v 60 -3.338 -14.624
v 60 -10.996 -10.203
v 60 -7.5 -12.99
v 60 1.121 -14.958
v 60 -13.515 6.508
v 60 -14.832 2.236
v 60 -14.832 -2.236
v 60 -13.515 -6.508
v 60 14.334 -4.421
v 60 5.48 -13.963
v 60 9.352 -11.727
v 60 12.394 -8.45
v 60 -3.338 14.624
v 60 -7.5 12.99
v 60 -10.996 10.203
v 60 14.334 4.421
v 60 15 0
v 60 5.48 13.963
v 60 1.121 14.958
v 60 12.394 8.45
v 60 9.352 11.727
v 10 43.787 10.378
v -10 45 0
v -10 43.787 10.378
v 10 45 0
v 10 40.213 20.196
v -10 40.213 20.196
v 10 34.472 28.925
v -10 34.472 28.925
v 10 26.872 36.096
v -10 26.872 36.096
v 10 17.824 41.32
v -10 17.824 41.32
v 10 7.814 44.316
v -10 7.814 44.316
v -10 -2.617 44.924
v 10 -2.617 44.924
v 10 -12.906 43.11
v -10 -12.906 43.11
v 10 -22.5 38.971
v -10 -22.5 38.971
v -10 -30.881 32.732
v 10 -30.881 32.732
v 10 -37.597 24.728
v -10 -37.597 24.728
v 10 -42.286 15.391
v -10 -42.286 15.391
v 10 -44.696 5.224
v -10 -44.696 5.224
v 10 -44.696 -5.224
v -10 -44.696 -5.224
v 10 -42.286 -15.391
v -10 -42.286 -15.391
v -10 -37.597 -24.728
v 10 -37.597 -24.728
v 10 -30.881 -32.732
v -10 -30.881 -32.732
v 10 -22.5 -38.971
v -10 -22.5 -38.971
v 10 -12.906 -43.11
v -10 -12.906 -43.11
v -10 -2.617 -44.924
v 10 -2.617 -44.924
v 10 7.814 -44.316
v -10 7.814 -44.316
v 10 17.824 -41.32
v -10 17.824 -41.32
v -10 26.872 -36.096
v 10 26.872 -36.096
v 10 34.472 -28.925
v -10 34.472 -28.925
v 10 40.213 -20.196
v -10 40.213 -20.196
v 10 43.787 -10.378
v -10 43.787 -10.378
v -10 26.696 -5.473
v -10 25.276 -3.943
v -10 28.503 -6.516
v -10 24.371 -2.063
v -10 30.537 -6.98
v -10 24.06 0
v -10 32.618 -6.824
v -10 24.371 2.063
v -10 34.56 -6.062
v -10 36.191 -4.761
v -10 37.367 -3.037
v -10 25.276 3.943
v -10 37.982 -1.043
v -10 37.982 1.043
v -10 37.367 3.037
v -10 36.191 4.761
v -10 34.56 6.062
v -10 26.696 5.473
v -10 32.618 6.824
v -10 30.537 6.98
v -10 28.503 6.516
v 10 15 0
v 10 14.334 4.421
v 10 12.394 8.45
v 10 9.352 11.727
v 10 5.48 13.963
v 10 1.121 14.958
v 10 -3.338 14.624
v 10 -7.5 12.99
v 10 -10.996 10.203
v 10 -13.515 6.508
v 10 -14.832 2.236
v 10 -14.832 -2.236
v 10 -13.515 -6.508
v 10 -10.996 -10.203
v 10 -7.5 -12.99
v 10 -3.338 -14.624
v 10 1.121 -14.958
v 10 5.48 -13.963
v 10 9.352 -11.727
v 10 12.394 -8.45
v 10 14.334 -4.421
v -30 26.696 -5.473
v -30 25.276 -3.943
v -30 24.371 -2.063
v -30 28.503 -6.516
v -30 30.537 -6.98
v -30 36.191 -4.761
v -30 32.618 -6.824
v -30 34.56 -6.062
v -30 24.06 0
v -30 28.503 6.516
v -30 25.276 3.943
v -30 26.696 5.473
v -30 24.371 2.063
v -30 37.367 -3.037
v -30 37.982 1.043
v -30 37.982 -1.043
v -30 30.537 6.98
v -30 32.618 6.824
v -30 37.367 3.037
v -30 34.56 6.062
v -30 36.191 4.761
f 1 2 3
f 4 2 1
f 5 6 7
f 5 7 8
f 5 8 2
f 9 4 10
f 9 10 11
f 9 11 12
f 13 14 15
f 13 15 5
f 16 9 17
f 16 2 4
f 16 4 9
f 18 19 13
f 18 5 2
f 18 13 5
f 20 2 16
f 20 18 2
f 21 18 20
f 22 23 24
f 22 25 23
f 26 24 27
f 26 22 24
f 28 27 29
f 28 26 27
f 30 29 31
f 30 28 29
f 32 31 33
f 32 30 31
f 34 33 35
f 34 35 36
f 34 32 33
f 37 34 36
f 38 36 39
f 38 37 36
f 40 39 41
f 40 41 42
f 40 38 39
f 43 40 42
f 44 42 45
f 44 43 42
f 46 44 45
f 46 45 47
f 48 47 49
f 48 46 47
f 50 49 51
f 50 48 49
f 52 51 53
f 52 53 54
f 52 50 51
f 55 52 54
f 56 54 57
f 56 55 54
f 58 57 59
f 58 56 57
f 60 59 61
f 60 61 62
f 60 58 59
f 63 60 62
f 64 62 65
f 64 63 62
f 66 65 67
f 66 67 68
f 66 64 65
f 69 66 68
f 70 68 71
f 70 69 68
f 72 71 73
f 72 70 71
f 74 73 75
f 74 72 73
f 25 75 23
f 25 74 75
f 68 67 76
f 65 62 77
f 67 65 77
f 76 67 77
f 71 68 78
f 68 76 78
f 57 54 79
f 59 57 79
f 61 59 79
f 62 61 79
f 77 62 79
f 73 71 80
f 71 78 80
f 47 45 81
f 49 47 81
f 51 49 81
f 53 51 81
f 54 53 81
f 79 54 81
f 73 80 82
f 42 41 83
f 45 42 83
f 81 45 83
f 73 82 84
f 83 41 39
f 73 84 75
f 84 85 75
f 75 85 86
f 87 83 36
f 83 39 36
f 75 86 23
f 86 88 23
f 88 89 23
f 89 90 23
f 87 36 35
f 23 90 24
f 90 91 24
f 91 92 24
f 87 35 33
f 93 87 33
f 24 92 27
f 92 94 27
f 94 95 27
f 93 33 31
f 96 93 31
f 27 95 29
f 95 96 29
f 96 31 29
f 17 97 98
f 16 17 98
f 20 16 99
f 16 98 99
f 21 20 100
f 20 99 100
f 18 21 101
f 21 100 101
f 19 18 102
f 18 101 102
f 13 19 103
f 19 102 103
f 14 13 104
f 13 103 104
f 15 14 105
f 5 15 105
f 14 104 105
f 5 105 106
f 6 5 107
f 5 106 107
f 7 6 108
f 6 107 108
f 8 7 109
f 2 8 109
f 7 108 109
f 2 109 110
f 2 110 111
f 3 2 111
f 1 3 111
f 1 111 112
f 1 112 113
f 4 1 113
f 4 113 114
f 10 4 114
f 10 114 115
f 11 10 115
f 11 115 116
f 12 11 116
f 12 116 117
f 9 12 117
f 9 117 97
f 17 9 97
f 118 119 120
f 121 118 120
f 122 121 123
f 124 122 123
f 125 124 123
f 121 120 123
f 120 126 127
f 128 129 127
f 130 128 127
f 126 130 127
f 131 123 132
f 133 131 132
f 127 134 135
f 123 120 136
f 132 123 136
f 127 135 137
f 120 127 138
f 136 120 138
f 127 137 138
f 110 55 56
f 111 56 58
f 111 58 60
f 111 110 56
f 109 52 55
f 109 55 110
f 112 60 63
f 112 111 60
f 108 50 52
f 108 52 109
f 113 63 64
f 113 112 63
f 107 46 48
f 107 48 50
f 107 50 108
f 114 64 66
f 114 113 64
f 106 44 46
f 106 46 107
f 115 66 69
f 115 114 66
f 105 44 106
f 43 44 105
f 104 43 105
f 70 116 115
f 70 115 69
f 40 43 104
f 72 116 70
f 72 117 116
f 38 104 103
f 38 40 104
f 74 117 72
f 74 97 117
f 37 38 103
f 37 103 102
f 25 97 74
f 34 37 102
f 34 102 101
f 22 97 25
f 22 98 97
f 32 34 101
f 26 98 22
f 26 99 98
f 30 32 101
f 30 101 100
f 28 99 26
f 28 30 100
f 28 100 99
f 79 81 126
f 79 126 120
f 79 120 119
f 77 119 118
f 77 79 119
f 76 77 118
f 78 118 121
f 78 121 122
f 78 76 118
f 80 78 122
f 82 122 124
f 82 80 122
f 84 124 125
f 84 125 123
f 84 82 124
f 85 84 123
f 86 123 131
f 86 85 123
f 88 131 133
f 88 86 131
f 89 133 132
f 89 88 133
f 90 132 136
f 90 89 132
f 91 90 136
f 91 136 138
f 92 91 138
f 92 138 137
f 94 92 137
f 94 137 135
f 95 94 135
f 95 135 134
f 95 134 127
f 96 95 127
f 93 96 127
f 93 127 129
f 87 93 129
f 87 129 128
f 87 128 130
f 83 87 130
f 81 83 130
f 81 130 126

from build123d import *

# Parameters (mm, degrees)
F0_R     = 45
F0_R_2   = 15
F1_DEPTH = 10
F2_DEPTH = 60
F3_DEPTH = 30


with BuildPart() as f1:
    # F0 (on Right) → F1 (new body, symmetric)
    with BuildSketch(Plane.YZ):
        Circle(F0_R)
        Circle(F0_R_2, mode=Mode.SUBTRACT)
        with BuildLine():
            ThreePointArc((38.06, 0), (31.06, -7), (24.06, 0))
            ThreePointArc((24.06, 0), (31.06, 7), (38.06, 0))
        make_face(mode=Mode.SUBTRACT)
        Circle(F0_R_2)
        with BuildLine():
            ThreePointArc((38.06, 0), (31.06, 7), (24.06, 0))
            ThreePointArc((24.06, 0), (31.06, -7), (38.06, 0))
        make_face()
    extrude(amount=F1_DEPTH, both=True)

    # F0 (on Right) → F2 (join)
    with BuildSketch(Plane.YZ):
        Circle(F0_R_2)
    extrude(amount=F2_DEPTH)

    # F0 (on Right) → F3 (join)
    with BuildSketch(Plane.YZ):
        with BuildLine():
            ThreePointArc((38.06, 0), (31.06, 7), (24.06, 0))
            ThreePointArc((24.06, 0), (31.06, -7), (38.06, 0))
        make_face()
    extrude(amount=-F3_DEPTH)


solid = f1.part
